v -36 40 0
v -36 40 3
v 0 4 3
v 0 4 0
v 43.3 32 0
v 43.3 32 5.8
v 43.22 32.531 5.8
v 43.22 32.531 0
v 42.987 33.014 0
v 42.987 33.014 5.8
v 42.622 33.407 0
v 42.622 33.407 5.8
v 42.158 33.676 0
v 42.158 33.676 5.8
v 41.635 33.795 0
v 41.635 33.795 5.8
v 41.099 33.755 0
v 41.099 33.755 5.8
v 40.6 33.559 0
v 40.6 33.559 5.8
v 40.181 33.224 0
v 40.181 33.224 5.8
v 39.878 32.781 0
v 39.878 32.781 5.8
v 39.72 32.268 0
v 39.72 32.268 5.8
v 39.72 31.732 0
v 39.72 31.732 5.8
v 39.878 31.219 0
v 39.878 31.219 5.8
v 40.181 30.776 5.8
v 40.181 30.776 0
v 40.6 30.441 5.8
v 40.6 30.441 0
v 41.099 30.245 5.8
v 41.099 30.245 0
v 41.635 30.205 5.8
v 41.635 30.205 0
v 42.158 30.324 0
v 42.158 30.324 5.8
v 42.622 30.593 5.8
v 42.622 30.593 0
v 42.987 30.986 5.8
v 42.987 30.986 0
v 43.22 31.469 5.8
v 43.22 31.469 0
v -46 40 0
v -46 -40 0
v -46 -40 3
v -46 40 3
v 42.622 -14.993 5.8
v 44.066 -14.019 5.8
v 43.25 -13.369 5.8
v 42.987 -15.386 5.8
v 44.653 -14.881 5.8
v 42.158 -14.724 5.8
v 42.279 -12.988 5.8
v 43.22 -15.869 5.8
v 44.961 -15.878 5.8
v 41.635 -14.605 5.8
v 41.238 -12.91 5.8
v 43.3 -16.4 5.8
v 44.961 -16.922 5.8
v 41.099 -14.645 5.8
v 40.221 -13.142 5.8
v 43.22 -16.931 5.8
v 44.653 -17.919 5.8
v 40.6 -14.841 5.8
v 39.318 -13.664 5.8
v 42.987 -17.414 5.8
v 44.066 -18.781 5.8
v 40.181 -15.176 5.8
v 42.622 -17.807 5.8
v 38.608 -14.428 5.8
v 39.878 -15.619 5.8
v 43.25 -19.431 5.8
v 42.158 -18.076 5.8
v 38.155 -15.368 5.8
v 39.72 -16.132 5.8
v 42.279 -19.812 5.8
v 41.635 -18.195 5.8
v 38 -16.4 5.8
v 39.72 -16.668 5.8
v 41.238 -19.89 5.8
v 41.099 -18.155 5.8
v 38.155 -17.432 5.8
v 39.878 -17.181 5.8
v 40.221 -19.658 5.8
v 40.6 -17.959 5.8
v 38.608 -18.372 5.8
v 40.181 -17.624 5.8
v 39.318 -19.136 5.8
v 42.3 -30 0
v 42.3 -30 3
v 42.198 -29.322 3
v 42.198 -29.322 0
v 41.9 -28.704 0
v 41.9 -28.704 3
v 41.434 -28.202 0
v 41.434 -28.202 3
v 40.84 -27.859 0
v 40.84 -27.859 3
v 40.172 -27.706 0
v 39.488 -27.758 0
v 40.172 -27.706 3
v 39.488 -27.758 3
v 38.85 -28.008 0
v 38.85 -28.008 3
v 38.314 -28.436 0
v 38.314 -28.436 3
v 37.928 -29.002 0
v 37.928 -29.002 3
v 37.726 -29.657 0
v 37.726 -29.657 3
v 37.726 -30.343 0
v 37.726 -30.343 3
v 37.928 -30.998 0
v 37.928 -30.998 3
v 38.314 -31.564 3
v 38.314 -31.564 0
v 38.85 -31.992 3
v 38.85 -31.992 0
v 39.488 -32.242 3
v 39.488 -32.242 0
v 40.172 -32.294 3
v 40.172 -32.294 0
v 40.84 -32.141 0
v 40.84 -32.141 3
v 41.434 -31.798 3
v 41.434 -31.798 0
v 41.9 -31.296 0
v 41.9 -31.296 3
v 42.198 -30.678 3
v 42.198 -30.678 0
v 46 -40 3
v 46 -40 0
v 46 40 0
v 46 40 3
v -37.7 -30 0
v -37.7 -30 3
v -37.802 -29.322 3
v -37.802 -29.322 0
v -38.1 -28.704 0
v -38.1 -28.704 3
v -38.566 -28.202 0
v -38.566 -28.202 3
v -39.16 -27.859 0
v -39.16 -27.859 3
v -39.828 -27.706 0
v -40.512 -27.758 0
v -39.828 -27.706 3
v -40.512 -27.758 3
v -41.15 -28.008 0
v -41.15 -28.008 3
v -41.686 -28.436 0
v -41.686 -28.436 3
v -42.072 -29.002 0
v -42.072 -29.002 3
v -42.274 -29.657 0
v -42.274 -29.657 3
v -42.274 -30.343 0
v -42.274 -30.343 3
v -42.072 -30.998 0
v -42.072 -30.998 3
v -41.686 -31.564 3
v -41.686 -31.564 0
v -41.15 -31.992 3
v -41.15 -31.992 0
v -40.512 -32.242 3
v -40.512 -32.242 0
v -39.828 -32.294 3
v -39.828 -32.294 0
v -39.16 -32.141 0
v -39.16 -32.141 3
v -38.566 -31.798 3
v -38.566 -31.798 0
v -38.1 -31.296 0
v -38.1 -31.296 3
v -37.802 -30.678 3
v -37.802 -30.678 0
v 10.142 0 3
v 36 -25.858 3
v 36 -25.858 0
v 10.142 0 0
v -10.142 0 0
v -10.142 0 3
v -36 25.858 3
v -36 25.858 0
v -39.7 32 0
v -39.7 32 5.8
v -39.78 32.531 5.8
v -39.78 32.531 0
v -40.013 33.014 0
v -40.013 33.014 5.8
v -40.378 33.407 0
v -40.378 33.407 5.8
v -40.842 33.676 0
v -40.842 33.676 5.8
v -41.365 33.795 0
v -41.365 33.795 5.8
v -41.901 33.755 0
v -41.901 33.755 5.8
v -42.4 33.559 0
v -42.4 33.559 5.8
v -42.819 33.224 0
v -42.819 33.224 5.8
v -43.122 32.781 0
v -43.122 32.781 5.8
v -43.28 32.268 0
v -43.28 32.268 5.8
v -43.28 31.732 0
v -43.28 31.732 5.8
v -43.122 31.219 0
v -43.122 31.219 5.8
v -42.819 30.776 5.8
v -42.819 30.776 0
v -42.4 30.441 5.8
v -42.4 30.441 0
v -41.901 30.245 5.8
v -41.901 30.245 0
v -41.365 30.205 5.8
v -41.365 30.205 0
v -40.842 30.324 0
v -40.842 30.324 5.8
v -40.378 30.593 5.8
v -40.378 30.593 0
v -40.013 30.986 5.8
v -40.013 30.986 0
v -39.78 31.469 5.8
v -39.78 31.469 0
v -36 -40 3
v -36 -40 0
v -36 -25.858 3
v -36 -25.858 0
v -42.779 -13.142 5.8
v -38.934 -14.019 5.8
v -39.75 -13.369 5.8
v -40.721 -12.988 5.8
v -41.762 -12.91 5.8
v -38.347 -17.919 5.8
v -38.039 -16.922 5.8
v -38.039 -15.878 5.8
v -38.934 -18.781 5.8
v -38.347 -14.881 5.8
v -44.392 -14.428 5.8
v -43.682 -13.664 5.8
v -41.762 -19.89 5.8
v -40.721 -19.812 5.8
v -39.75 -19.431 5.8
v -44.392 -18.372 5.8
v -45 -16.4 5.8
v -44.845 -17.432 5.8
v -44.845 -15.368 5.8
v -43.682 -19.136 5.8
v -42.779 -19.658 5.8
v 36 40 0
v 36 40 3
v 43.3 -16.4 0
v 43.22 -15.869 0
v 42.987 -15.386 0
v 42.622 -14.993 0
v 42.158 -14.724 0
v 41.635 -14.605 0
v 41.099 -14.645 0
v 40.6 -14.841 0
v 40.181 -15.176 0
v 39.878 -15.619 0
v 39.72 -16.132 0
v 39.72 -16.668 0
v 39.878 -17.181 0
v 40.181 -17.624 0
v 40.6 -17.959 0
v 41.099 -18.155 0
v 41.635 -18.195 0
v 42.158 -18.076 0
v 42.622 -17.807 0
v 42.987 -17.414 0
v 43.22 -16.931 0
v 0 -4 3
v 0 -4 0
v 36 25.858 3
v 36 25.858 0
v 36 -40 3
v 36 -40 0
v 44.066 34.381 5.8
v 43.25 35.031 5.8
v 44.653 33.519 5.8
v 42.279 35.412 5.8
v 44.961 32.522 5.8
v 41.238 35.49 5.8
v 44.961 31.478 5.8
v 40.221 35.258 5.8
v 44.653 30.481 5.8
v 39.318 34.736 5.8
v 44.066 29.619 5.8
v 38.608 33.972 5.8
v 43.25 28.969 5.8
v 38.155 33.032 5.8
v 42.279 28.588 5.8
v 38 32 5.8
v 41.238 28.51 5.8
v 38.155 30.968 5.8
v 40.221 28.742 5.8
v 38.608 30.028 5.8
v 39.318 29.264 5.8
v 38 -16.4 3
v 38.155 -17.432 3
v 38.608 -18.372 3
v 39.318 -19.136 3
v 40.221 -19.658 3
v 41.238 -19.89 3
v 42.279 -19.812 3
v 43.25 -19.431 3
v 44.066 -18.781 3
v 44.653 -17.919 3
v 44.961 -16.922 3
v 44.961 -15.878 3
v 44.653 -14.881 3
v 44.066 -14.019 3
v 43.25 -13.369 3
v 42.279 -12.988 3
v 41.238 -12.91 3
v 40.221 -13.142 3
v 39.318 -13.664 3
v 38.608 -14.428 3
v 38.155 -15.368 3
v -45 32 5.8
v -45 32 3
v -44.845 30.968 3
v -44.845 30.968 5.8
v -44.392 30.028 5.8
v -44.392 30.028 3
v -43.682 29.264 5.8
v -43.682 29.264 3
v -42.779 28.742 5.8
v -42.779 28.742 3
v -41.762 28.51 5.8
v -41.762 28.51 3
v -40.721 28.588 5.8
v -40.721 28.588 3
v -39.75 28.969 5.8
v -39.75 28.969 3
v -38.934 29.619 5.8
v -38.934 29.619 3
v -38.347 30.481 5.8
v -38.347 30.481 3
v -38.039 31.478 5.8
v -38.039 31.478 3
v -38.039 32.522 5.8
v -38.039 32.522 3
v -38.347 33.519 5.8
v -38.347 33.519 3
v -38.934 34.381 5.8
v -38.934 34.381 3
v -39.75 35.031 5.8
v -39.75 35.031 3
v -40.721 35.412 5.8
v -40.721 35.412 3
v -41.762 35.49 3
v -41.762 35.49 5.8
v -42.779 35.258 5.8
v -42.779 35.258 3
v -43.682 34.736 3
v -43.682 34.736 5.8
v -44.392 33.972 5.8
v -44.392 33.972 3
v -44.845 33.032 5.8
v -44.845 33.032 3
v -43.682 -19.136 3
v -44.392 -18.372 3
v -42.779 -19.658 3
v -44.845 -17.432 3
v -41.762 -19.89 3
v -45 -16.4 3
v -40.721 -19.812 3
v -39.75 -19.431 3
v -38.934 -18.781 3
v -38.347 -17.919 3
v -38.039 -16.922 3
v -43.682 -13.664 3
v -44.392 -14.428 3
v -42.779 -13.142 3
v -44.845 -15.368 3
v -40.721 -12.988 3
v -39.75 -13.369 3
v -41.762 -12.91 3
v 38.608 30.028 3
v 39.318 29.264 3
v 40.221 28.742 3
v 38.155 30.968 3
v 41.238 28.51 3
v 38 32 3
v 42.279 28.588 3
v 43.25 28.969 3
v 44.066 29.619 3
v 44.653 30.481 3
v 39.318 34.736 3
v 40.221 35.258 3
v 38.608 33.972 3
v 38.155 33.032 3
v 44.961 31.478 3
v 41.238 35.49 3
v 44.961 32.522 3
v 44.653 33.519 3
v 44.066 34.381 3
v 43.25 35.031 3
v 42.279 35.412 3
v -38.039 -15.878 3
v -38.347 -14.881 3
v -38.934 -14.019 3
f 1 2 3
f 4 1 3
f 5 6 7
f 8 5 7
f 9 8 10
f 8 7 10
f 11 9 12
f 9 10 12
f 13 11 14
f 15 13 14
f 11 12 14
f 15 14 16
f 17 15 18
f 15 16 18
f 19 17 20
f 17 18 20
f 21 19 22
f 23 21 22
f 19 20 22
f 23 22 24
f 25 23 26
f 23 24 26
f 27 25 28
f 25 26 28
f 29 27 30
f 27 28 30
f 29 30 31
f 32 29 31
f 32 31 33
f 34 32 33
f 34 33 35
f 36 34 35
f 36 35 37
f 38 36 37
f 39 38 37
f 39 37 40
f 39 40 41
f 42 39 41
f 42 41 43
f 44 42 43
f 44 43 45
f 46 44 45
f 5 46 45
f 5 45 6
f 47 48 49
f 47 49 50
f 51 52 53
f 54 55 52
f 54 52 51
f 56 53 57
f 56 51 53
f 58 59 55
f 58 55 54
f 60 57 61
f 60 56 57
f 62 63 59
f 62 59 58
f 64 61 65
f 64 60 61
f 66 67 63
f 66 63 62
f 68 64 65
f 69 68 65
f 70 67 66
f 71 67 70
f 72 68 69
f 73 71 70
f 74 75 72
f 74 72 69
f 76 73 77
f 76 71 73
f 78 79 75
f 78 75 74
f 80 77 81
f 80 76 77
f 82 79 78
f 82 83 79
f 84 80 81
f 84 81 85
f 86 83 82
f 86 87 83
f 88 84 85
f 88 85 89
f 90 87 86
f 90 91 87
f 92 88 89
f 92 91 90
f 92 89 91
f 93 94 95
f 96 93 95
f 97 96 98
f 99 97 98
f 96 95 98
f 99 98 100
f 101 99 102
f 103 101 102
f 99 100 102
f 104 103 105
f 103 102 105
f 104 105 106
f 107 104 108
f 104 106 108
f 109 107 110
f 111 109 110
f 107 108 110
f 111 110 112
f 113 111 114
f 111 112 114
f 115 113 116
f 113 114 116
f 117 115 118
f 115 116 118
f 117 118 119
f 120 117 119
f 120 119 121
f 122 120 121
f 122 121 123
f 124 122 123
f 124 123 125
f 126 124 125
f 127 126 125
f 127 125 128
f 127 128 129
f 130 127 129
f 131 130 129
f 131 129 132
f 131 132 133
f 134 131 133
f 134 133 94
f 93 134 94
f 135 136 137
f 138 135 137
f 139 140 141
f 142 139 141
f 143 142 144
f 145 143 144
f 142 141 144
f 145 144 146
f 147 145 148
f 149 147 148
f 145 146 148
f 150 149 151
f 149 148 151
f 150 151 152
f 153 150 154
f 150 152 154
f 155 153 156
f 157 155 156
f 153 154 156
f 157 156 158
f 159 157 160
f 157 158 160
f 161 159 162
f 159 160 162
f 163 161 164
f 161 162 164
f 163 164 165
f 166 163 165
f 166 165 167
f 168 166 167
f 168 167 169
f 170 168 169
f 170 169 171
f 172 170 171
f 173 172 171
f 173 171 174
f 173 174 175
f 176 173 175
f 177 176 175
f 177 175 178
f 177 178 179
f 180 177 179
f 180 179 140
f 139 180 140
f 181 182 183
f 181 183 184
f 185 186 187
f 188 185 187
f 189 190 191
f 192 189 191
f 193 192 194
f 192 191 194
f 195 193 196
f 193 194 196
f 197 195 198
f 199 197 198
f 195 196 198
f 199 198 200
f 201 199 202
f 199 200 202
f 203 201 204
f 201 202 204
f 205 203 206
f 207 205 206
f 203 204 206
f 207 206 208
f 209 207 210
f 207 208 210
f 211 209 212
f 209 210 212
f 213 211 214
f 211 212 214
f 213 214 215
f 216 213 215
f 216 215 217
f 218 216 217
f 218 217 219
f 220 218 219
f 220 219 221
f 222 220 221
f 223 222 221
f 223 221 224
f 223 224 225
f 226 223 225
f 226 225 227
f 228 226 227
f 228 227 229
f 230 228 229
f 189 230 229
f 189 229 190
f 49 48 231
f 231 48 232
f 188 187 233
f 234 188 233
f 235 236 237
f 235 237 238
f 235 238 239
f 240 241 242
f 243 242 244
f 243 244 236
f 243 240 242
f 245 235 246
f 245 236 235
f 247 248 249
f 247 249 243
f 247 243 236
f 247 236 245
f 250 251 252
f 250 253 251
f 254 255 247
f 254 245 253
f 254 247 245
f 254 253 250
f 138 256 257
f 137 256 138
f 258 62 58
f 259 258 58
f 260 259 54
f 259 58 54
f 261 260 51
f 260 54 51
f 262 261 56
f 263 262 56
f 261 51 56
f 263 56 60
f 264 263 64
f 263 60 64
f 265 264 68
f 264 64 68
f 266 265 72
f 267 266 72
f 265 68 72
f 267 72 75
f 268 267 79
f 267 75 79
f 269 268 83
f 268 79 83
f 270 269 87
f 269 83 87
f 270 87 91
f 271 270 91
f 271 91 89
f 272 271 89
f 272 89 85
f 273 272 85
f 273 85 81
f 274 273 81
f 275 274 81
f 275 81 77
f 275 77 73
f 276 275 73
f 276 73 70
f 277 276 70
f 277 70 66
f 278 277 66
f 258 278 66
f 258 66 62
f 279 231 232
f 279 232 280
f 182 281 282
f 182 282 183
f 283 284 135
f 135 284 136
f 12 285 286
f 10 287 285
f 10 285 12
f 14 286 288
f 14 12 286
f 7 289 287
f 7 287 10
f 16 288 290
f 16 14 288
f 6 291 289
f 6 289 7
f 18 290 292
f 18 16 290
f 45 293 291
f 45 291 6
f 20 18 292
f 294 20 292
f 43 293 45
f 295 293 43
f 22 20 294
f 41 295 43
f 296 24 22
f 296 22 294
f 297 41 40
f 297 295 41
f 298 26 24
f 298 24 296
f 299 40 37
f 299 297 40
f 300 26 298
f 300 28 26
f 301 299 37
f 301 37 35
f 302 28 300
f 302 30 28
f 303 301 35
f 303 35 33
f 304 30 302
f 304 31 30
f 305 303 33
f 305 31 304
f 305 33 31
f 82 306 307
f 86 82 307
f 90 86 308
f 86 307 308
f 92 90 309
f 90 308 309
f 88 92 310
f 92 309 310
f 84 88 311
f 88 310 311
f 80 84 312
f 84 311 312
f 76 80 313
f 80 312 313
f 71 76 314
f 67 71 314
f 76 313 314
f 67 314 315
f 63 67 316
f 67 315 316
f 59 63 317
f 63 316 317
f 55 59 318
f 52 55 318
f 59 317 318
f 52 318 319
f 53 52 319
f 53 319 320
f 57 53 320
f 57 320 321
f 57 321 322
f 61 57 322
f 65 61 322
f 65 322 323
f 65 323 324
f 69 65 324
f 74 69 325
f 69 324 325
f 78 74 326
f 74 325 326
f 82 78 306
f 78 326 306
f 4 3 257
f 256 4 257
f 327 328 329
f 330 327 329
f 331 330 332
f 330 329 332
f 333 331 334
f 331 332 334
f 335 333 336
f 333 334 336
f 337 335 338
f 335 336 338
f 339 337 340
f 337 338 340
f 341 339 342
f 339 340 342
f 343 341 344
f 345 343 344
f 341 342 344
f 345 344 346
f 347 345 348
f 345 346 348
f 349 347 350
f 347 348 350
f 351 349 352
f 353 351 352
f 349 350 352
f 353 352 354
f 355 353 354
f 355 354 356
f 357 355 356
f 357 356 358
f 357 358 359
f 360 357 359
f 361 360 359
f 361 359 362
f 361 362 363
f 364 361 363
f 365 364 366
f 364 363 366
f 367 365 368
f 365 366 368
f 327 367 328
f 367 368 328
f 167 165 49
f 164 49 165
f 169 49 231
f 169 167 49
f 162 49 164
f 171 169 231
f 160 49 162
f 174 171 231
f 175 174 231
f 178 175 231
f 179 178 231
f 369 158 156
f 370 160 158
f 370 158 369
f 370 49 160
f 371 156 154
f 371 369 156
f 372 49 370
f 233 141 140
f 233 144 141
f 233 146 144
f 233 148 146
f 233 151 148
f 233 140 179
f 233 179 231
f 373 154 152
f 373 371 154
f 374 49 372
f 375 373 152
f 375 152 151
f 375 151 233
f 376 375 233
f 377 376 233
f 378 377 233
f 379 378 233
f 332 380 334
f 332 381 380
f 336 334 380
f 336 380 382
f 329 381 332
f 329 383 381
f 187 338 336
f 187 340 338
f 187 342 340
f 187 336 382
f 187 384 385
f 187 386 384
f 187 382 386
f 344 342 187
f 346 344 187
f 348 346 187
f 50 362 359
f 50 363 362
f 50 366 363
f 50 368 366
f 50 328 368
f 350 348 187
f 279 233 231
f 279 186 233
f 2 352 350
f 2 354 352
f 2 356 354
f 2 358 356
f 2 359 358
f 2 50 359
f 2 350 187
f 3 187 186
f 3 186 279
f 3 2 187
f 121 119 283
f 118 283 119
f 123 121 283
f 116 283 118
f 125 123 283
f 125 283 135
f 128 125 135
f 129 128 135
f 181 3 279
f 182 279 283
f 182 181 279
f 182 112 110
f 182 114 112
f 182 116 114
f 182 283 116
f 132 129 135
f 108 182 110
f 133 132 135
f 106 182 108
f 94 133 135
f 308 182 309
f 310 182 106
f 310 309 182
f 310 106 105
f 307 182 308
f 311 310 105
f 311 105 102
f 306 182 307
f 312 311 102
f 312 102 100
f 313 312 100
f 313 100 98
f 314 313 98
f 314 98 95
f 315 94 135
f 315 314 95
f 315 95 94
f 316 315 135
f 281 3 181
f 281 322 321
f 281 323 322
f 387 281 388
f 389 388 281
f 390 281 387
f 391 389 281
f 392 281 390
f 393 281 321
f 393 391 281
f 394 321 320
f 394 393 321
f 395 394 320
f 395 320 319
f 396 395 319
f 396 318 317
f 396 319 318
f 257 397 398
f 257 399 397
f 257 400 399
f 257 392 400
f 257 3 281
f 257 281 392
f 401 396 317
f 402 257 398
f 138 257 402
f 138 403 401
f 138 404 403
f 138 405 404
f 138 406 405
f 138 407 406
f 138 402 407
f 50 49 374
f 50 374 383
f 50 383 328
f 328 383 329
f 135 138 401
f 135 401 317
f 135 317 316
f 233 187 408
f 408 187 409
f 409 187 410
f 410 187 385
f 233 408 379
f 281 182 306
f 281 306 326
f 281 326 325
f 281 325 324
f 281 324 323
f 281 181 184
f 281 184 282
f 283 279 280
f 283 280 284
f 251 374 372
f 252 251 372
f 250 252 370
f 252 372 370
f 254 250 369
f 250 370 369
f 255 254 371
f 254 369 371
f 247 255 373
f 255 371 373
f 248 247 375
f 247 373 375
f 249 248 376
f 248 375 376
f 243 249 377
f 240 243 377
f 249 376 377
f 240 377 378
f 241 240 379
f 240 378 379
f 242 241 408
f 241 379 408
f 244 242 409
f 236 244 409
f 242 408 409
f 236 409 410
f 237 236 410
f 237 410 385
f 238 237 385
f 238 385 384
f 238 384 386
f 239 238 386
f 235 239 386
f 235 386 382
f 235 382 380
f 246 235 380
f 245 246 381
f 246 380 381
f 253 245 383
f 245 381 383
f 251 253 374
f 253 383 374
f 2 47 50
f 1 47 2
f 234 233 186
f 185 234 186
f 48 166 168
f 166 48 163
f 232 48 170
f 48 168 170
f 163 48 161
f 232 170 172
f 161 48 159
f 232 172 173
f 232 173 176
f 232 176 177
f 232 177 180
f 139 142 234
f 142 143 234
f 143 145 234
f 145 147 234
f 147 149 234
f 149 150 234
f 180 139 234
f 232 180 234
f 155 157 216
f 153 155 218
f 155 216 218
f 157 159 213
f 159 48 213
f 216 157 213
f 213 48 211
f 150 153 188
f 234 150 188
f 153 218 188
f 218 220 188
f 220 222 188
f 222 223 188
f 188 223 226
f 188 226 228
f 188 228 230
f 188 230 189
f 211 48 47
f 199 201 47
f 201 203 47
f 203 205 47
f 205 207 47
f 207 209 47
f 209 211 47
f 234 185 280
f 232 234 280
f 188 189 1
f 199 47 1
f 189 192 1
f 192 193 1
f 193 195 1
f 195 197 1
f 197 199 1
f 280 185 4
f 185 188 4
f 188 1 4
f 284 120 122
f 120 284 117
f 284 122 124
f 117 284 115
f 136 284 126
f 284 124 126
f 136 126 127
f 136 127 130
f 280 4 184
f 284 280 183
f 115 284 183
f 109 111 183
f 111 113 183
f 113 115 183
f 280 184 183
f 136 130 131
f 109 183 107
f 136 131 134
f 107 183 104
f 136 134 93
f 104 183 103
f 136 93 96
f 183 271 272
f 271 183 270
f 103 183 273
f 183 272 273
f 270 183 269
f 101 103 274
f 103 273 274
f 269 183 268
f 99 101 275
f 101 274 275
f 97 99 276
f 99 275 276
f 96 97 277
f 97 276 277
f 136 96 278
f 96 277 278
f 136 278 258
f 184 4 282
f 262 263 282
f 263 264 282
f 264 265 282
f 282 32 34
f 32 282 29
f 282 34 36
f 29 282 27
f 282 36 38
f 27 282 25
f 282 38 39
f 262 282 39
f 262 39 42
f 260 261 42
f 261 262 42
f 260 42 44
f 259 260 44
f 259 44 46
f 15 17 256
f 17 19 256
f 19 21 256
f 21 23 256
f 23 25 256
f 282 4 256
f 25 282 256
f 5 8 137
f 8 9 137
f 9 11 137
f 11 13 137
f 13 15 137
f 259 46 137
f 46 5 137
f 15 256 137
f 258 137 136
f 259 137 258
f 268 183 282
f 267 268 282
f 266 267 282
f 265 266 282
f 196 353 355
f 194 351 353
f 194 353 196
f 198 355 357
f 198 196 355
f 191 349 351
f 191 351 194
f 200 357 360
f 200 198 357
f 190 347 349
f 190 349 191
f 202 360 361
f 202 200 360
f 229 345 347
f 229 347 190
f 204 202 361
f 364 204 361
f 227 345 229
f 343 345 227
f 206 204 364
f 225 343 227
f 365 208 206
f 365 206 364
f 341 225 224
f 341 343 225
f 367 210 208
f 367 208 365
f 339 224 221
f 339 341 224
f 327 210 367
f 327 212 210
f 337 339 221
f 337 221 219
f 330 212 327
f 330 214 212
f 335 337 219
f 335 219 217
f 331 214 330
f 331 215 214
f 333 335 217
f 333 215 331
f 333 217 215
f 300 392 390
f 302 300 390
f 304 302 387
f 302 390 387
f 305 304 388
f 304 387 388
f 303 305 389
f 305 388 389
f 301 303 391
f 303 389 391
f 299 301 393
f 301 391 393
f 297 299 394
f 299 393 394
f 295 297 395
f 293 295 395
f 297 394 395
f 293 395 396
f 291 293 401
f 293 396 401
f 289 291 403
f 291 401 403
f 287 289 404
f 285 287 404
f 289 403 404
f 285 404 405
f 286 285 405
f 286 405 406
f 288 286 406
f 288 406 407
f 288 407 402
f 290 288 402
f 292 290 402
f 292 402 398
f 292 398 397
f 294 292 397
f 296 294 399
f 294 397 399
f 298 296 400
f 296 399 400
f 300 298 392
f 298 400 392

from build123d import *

# Parameters (mm, degrees)
SKETCH1_W           = 92
SKETCH1_H           = 80
BOSS_EXTRUDE1_DEPTH = 3
CUT_EXTRUDE1_DEPTH  = 62.032778079
SKETCH3_R           = 3.5
BOSS_EXTRUDE2_DEPTH = 2.8
SKETCH4_R           = 1.8
CUT_EXTRUDE2_DEPTH  = 62.234304111
SKETCH5_R           = 2.3
CUT_EXTRUDE3_DEPTH  = 62.032778079


with BuildPart() as part:
    # Sketch1 → Boss-Extrude1 (new body)
    with BuildSketch(Plane.XY):
        Rectangle(SKETCH1_W, SKETCH1_H)
    extrude(amount=BOSS_EXTRUDE1_DEPTH)

    # Sketch2 → Cut-Extrude1 (cut, through all)
    with BuildSketch(Plane.XY.offset(3)):
        Polygon((-36, 40), (0, 4), (36, 40), align=None)
        Polygon((-36, 25.857864376), (-36, -25.857864376), (-10.142135624, 0), align=None)
        Polygon((-36, -40), (0, -4), (36, -40), align=None)
        Polygon((36, 25.857864376), (36, -25.857864376), (10.142135624, 0), align=None)
    extrude(amount=-CUT_EXTRUDE1_DEPTH, mode=Mode.SUBTRACT)

    # Sketch3 → Boss-Extrude2 (add)
    with BuildSketch(Plane.XY.offset(3)):
        with Locations(Location((-41.5, 32, 0), (0, 0, 180))):
            Circle(SKETCH3_R)
        with Locations(Location((-41.5, -16.4, 0), (0, 0, 180))):
            Circle(SKETCH3_R)
        with Locations(Location((41.5, -16.4, 0), (0, 0, 180))):
            Circle(SKETCH3_R)
        with Locations(Location((41.5, 32, 0), (0, 0, 180))):
            Circle(SKETCH3_R)
    extrude(amount=BOSS_EXTRUDE2_DEPTH)

    # Sketch4 → Cut-Extrude2 (cut, through all)
    with BuildSketch(Plane.XY.offset(5.8)):
        with Locations((-41.5, 32)):
            Circle(SKETCH4_R)
        with Locations((41.5, 32)):
            Circle(SKETCH4_R)
        with Locations((41.5, -16.4)):
            Circle(SKETCH4_R)
    extrude(amount=-CUT_EXTRUDE2_DEPTH, mode=Mode.SUBTRACT)

    # Sketch5 → Cut-Extrude3 (cut, through all)
    with BuildSketch(Plane.XY.offset(3)):
        with Locations((-40, -30)):
            Circle(SKETCH5_R)
        with Locations((40, -30)):
            Circle(SKETCH5_R)
    extrude(amount=-CUT_EXTRUDE3_DEPTH, mode=Mode.SUBTRACT)


solid = part.part
